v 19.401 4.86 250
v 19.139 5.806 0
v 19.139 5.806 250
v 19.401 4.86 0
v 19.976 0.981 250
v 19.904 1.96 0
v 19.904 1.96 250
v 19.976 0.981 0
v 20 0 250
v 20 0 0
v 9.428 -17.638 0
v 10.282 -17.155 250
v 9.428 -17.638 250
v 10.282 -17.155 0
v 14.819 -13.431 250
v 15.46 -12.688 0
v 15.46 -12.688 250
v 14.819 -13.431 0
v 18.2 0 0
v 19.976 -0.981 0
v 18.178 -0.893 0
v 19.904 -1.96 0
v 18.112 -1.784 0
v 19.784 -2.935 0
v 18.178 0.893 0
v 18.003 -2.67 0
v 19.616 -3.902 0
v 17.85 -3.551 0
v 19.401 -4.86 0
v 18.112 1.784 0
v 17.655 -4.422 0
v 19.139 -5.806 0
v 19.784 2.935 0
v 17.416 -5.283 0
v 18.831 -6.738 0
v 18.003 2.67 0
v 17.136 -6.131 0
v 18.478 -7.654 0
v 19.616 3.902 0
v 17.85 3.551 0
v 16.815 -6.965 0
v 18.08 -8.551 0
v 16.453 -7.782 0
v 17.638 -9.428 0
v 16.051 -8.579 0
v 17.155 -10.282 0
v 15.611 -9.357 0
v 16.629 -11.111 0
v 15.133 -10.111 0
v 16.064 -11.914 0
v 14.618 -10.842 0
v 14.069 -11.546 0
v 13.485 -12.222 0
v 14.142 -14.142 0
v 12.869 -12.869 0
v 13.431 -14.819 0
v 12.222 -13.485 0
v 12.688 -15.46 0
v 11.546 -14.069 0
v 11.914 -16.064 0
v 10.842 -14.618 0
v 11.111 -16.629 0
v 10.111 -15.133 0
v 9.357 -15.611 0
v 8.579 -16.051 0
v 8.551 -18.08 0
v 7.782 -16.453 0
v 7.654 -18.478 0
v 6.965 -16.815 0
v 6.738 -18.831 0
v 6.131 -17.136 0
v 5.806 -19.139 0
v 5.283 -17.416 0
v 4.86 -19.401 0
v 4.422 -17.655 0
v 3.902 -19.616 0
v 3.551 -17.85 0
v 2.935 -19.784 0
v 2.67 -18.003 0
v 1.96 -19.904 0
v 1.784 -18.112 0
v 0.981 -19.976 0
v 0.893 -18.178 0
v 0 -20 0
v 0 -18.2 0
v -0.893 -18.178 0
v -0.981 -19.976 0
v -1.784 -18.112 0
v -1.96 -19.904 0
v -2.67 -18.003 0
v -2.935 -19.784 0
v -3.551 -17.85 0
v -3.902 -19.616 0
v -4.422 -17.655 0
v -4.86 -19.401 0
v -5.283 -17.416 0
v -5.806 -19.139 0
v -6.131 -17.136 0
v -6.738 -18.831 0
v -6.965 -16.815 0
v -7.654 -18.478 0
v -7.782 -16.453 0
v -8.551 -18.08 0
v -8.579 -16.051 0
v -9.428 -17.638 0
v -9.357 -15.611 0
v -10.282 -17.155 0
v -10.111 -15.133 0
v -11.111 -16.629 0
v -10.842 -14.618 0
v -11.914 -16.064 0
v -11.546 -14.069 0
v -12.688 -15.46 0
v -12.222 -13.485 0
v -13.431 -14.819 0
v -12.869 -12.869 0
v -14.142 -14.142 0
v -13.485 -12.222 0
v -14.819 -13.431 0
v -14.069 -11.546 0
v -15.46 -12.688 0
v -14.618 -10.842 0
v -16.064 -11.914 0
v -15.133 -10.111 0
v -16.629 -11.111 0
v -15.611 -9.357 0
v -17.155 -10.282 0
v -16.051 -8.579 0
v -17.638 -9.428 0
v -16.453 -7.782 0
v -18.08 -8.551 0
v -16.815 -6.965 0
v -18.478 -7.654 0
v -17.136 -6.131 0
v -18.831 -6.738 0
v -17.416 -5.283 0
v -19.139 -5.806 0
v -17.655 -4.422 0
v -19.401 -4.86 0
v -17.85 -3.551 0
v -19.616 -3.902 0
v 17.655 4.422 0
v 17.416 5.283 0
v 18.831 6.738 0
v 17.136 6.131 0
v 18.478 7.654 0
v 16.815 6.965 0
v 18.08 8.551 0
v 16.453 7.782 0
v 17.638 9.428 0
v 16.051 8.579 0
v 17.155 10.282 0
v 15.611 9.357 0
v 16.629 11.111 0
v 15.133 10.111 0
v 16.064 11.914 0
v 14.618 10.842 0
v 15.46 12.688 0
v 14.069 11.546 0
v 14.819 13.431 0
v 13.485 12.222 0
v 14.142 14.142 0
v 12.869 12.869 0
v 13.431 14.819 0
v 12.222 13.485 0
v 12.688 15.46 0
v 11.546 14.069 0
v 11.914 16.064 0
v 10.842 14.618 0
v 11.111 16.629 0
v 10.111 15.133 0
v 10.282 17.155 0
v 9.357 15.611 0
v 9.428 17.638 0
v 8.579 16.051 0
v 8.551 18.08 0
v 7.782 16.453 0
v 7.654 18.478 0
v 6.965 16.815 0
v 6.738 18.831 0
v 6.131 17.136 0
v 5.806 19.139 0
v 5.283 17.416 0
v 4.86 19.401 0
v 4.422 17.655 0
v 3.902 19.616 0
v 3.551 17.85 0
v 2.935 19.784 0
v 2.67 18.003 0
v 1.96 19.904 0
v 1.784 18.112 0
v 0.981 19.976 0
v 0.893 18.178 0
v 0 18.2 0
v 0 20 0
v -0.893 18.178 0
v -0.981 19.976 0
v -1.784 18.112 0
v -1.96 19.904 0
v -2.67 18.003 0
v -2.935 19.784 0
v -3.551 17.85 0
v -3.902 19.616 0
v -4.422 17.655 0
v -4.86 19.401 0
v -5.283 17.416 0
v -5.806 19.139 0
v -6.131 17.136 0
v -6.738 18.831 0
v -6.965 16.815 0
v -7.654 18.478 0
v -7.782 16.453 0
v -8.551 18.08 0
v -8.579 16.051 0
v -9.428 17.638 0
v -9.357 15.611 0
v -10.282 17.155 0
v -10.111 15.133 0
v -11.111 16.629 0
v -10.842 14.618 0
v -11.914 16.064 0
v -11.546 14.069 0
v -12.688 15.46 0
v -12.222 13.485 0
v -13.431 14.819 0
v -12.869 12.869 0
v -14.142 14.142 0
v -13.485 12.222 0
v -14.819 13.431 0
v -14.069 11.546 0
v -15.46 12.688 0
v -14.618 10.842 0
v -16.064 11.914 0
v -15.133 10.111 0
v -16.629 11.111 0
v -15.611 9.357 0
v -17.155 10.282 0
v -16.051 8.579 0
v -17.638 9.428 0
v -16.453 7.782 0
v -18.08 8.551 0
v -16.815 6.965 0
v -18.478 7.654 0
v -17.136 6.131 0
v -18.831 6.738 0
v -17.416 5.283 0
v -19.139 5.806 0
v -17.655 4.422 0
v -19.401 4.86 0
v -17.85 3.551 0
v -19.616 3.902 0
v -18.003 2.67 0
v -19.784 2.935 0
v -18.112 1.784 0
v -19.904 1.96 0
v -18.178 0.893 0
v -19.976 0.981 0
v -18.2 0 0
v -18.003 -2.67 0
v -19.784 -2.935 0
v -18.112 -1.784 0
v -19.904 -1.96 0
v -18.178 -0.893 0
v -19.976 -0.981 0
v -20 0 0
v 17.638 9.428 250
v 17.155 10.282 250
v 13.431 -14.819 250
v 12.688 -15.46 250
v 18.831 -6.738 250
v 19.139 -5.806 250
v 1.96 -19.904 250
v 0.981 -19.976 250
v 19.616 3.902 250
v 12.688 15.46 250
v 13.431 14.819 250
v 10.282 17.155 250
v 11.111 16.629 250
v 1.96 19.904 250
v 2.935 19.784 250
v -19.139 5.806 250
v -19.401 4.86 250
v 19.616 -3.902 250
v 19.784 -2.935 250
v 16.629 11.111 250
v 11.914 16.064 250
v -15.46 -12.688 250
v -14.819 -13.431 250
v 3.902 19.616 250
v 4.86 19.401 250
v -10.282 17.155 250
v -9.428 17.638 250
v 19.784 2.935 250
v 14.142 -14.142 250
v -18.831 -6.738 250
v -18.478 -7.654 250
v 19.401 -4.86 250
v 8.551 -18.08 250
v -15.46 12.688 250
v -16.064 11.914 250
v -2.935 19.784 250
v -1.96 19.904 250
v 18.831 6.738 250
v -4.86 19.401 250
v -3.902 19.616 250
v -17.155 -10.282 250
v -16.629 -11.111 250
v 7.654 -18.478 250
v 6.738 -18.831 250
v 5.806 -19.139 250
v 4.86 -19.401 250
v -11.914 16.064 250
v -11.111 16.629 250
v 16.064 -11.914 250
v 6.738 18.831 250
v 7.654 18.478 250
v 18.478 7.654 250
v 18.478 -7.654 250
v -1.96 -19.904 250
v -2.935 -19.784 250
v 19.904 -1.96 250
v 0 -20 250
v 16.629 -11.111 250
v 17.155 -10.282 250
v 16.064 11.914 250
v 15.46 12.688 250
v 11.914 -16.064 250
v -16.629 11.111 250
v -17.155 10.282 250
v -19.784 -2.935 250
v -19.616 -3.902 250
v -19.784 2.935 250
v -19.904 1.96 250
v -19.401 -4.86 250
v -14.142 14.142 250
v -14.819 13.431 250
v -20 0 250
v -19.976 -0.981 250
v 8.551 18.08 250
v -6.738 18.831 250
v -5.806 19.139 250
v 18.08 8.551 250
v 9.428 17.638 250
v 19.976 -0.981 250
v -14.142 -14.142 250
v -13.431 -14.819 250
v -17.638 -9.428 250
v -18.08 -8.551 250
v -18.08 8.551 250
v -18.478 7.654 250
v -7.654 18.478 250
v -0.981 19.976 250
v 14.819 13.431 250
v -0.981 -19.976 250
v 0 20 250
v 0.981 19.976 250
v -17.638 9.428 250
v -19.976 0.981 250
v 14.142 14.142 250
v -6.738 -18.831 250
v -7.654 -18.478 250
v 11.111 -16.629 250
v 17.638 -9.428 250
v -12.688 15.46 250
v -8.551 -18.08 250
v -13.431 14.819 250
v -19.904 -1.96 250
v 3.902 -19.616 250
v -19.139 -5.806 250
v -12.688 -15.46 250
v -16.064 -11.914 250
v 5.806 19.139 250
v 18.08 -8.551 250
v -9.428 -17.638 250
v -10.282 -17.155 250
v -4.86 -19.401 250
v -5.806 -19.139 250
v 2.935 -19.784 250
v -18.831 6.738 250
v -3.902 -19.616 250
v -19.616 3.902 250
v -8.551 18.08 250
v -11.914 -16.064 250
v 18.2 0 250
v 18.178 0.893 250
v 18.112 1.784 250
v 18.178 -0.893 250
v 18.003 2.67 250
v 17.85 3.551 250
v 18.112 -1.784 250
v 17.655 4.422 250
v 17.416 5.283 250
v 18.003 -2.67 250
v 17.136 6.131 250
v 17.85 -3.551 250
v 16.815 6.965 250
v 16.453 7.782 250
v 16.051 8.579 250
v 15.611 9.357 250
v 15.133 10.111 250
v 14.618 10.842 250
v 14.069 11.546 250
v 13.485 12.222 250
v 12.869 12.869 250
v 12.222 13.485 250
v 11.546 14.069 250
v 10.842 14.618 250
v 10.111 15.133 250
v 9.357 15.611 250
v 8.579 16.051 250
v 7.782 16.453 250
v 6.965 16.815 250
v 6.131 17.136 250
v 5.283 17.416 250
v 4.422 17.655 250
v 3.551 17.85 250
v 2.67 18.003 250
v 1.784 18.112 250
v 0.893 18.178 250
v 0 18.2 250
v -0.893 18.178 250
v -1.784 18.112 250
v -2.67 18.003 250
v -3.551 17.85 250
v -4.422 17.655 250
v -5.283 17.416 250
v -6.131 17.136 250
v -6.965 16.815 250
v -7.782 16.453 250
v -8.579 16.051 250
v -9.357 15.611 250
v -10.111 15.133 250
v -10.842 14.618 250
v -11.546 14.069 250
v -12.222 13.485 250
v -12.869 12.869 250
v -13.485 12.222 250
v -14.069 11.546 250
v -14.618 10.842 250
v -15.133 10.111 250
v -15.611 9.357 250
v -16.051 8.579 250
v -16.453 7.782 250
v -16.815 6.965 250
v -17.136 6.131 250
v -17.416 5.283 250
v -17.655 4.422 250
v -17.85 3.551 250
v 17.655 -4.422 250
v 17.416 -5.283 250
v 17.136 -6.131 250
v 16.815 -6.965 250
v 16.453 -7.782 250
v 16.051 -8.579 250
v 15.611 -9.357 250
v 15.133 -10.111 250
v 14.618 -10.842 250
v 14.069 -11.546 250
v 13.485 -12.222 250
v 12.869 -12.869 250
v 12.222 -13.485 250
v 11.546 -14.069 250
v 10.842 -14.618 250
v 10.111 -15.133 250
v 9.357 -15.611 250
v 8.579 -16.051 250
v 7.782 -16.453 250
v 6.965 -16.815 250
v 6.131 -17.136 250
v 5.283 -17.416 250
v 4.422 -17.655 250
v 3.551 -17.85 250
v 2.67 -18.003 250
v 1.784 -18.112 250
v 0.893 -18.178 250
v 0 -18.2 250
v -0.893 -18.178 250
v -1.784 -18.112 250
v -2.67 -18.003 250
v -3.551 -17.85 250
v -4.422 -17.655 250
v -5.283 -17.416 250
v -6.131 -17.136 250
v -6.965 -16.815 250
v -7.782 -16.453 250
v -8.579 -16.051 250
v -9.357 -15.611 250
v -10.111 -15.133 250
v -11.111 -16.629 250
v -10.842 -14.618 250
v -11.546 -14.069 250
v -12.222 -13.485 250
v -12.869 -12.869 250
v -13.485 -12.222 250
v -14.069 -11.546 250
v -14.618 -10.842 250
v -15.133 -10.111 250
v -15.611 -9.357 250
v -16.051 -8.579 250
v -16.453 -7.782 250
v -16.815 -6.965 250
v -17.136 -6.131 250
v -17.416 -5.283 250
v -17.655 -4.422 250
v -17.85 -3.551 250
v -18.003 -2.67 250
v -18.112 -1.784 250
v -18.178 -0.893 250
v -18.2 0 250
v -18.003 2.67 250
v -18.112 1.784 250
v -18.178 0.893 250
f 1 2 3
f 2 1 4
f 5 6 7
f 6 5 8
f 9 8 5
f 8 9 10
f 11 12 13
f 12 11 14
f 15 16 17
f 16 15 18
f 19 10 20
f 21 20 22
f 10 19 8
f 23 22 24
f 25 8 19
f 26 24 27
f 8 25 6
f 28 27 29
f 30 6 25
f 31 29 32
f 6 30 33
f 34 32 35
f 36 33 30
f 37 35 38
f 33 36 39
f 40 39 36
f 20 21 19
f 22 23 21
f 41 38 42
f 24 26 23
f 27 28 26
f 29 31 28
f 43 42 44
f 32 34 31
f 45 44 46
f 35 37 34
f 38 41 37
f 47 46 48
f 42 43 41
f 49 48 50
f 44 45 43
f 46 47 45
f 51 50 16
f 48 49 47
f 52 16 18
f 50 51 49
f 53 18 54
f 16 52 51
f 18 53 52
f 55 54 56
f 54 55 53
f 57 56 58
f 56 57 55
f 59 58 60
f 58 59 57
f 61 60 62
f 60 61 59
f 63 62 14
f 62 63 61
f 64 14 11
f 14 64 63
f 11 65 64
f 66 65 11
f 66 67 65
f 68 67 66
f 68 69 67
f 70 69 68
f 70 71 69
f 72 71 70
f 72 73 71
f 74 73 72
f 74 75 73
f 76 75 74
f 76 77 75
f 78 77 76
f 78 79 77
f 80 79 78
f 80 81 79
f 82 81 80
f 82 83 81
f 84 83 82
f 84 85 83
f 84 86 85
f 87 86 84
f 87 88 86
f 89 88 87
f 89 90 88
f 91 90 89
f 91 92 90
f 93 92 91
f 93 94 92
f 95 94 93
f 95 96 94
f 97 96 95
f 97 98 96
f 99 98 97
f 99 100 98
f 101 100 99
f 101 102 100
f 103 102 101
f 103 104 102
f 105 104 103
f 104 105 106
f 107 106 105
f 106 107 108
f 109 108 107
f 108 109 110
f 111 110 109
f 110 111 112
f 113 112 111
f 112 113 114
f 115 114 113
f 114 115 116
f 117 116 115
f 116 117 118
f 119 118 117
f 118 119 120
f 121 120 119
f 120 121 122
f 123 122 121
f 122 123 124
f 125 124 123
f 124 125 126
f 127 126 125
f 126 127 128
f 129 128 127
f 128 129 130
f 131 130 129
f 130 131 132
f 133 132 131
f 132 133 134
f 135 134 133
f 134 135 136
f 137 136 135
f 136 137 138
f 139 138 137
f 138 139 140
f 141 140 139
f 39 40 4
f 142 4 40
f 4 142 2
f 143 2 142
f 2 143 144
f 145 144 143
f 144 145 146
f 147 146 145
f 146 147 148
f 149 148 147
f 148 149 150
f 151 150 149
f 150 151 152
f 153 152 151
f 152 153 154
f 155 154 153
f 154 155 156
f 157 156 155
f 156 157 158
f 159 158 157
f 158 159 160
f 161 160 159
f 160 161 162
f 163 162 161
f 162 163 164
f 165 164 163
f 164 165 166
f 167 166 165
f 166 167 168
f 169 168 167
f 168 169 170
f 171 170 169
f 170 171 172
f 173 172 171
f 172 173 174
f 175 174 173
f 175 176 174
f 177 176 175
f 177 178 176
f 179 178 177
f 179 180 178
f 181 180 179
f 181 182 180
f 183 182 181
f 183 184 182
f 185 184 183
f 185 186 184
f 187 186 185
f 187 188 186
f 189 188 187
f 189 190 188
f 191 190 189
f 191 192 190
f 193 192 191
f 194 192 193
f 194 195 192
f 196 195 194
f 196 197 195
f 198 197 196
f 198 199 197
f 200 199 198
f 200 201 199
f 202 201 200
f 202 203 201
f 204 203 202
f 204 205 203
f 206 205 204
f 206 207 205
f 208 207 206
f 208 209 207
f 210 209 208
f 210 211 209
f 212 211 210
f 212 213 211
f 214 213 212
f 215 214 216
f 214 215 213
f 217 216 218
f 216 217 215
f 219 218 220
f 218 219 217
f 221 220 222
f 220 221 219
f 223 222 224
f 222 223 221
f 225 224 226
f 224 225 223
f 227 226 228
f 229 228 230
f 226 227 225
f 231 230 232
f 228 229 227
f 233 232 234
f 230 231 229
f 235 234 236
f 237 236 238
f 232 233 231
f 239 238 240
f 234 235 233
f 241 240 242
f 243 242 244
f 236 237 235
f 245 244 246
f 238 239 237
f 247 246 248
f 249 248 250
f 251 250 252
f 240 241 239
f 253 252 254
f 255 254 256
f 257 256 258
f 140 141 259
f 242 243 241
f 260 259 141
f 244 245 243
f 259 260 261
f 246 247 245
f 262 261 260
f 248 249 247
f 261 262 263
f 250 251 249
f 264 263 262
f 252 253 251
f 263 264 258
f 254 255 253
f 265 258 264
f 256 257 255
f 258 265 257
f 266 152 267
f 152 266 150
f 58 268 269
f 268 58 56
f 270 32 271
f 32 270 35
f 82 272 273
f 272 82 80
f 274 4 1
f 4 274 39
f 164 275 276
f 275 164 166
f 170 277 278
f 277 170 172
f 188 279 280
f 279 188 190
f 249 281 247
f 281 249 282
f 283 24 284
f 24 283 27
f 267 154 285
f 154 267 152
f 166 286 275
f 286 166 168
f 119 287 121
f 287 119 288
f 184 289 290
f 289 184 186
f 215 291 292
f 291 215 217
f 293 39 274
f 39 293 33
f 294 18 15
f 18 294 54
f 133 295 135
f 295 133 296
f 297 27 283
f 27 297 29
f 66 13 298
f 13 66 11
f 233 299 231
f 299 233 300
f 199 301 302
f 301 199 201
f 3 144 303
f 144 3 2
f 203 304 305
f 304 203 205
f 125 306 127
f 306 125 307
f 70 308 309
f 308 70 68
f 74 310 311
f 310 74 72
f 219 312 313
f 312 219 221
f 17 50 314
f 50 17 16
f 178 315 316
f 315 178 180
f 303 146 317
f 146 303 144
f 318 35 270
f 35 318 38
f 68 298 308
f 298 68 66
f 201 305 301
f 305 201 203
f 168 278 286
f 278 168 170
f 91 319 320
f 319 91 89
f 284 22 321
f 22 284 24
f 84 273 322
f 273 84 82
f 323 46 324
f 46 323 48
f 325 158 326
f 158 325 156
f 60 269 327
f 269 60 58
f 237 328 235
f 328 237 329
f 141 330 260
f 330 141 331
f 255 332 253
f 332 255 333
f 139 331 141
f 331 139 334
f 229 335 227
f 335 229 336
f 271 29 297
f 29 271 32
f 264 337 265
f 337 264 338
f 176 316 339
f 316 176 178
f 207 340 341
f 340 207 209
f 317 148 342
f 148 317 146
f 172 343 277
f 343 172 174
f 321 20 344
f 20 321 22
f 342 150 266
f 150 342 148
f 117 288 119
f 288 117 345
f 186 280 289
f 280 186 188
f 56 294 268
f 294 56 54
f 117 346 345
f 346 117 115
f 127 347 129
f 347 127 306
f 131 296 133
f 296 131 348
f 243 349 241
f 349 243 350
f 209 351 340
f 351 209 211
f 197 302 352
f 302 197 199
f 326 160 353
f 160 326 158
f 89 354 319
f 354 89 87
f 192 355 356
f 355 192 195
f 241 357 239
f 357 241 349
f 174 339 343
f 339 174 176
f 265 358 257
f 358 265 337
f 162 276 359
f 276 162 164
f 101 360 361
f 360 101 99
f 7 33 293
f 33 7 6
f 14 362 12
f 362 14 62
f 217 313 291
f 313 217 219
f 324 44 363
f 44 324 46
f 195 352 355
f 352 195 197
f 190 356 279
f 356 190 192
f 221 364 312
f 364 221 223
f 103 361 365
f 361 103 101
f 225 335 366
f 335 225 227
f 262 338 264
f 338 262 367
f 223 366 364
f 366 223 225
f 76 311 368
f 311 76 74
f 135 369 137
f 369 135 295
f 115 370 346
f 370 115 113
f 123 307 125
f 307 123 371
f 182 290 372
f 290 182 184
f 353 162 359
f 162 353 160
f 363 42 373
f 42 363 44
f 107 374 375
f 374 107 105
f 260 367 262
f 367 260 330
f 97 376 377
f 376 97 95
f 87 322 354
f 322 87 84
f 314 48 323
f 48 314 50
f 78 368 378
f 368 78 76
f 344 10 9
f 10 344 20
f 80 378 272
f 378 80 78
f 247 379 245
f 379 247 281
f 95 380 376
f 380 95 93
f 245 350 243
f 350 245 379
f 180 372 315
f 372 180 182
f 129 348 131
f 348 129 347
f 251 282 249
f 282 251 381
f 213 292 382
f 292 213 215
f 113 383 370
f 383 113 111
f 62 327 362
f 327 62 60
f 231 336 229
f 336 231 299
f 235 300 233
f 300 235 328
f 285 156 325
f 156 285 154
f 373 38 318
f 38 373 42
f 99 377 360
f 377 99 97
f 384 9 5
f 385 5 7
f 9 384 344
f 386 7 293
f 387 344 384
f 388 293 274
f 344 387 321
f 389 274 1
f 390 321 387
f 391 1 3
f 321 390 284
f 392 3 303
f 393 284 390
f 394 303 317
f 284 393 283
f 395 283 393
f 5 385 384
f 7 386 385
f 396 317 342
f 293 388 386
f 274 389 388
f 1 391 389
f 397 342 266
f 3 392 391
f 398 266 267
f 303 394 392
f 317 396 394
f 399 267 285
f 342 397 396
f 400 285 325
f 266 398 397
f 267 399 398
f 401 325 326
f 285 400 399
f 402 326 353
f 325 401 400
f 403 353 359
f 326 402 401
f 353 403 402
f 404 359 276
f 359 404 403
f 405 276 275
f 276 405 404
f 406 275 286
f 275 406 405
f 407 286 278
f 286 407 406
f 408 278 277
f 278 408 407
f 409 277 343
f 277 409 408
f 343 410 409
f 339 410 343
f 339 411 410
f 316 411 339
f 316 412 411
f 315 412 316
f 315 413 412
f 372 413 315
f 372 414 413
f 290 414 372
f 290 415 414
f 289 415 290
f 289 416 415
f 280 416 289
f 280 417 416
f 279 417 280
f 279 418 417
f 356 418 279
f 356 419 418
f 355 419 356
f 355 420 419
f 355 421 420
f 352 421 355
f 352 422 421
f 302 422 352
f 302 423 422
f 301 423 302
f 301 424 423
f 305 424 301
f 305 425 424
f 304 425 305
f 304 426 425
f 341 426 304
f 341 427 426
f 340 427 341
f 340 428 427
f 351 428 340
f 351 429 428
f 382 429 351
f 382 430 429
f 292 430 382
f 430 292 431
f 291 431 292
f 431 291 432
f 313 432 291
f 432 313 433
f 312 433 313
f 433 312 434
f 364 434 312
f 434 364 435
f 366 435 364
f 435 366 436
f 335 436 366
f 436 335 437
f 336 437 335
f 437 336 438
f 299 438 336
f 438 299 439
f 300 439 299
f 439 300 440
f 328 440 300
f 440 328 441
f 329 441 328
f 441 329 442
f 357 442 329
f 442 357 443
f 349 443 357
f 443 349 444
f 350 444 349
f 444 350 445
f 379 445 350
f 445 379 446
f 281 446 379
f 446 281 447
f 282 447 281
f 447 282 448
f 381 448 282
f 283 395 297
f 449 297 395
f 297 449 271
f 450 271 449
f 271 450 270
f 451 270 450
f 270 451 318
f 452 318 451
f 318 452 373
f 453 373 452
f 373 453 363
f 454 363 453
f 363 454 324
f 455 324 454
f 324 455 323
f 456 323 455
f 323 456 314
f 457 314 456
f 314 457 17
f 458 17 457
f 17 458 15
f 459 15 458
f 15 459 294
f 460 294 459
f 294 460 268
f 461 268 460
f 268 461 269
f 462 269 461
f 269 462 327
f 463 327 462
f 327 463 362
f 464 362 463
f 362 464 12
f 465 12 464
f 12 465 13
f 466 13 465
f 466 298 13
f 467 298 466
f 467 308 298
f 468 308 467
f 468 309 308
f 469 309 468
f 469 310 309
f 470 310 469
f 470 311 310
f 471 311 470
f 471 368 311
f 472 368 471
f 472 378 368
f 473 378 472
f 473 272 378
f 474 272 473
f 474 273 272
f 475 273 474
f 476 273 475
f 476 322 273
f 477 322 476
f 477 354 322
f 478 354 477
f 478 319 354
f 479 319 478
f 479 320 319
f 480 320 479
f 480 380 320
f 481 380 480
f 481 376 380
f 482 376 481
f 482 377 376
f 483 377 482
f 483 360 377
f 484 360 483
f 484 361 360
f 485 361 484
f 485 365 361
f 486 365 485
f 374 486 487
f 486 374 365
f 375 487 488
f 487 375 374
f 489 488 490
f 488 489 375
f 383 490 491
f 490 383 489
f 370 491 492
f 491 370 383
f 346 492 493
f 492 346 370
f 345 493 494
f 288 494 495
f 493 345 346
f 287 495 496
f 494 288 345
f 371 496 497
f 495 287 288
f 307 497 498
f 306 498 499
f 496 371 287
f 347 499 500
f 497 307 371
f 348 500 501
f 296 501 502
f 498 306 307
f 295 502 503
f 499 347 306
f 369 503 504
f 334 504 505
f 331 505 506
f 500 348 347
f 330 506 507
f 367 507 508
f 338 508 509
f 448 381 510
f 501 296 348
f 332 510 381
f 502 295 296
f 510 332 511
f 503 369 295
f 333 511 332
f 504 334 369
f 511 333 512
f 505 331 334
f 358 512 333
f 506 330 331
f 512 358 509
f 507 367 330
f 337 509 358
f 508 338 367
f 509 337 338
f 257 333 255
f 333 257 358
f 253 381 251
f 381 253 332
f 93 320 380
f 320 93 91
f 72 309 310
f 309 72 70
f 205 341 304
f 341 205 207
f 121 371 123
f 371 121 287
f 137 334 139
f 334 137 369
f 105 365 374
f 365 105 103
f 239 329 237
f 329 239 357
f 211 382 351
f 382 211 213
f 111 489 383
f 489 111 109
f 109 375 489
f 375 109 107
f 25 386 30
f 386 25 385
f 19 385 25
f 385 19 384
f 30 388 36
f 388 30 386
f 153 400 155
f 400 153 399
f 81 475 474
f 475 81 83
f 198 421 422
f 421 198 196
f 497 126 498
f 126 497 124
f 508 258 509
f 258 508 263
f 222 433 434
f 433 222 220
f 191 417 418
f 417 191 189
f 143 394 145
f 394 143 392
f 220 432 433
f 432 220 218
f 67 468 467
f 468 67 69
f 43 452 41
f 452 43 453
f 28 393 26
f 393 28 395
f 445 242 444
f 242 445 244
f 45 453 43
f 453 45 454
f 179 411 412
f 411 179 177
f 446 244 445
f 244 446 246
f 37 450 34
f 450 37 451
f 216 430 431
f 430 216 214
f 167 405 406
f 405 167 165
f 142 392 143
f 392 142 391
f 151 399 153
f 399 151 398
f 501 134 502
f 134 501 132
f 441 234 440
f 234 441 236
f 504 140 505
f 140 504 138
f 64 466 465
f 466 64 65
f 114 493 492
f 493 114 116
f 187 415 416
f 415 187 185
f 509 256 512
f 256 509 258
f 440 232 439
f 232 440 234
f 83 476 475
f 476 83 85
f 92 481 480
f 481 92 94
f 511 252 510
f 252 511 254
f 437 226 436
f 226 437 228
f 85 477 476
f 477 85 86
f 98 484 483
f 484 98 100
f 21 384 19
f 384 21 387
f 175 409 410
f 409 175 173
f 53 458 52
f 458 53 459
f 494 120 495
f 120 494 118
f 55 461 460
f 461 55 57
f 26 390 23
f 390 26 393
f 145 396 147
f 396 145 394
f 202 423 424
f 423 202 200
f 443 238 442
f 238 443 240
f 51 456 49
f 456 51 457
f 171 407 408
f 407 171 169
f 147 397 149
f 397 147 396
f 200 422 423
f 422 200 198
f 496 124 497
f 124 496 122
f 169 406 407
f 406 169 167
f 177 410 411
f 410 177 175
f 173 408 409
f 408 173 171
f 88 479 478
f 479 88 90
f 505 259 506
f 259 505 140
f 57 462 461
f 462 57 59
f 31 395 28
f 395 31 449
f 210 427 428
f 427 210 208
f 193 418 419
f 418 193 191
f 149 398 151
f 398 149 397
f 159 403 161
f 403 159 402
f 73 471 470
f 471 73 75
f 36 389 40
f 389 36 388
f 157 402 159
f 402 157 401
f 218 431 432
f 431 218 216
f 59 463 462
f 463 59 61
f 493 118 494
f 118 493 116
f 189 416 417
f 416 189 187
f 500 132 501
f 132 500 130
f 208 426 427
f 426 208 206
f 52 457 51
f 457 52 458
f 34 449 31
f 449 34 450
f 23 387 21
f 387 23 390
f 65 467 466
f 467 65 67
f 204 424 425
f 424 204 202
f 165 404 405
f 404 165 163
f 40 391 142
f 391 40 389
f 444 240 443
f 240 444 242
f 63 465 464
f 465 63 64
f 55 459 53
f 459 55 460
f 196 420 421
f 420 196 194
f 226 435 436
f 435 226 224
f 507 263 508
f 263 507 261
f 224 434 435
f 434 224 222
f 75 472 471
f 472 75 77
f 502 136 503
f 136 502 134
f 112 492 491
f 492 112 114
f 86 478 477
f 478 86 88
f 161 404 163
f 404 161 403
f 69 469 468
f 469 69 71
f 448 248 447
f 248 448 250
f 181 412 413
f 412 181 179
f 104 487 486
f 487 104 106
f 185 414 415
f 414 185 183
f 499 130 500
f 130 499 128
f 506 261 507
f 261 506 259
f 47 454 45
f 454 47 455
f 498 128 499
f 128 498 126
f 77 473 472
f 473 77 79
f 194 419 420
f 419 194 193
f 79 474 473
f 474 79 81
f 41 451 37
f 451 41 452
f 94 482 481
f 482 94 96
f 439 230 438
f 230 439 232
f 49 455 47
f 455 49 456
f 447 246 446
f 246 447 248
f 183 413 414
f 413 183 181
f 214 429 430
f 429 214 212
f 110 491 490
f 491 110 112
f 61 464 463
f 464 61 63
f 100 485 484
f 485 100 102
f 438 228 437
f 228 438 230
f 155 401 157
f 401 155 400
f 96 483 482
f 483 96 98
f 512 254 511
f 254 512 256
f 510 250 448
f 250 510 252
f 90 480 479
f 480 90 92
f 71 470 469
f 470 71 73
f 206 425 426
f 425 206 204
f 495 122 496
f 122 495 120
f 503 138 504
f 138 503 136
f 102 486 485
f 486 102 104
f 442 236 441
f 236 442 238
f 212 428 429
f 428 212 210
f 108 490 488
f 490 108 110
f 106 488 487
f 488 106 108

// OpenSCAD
$fn = 128;

// HT pipe (approx.) - DN40, length 250 mm
// Typical HT DN40 dimensions (approx):
// - Outer diameter: 40 mm
// - Wall thickness: 1.8 mm
// Adjust as needed.

pipe_length = 250;
outer_d = 40;
wall = 1.8;

inner_d = outer_d - 2*wall;

difference() {
    cylinder(h = pipe_length, d = outer_d);
    translate([0,0,-0.1])
        cylinder(h = pipe_length + 0.2, d = inner_d);
}
